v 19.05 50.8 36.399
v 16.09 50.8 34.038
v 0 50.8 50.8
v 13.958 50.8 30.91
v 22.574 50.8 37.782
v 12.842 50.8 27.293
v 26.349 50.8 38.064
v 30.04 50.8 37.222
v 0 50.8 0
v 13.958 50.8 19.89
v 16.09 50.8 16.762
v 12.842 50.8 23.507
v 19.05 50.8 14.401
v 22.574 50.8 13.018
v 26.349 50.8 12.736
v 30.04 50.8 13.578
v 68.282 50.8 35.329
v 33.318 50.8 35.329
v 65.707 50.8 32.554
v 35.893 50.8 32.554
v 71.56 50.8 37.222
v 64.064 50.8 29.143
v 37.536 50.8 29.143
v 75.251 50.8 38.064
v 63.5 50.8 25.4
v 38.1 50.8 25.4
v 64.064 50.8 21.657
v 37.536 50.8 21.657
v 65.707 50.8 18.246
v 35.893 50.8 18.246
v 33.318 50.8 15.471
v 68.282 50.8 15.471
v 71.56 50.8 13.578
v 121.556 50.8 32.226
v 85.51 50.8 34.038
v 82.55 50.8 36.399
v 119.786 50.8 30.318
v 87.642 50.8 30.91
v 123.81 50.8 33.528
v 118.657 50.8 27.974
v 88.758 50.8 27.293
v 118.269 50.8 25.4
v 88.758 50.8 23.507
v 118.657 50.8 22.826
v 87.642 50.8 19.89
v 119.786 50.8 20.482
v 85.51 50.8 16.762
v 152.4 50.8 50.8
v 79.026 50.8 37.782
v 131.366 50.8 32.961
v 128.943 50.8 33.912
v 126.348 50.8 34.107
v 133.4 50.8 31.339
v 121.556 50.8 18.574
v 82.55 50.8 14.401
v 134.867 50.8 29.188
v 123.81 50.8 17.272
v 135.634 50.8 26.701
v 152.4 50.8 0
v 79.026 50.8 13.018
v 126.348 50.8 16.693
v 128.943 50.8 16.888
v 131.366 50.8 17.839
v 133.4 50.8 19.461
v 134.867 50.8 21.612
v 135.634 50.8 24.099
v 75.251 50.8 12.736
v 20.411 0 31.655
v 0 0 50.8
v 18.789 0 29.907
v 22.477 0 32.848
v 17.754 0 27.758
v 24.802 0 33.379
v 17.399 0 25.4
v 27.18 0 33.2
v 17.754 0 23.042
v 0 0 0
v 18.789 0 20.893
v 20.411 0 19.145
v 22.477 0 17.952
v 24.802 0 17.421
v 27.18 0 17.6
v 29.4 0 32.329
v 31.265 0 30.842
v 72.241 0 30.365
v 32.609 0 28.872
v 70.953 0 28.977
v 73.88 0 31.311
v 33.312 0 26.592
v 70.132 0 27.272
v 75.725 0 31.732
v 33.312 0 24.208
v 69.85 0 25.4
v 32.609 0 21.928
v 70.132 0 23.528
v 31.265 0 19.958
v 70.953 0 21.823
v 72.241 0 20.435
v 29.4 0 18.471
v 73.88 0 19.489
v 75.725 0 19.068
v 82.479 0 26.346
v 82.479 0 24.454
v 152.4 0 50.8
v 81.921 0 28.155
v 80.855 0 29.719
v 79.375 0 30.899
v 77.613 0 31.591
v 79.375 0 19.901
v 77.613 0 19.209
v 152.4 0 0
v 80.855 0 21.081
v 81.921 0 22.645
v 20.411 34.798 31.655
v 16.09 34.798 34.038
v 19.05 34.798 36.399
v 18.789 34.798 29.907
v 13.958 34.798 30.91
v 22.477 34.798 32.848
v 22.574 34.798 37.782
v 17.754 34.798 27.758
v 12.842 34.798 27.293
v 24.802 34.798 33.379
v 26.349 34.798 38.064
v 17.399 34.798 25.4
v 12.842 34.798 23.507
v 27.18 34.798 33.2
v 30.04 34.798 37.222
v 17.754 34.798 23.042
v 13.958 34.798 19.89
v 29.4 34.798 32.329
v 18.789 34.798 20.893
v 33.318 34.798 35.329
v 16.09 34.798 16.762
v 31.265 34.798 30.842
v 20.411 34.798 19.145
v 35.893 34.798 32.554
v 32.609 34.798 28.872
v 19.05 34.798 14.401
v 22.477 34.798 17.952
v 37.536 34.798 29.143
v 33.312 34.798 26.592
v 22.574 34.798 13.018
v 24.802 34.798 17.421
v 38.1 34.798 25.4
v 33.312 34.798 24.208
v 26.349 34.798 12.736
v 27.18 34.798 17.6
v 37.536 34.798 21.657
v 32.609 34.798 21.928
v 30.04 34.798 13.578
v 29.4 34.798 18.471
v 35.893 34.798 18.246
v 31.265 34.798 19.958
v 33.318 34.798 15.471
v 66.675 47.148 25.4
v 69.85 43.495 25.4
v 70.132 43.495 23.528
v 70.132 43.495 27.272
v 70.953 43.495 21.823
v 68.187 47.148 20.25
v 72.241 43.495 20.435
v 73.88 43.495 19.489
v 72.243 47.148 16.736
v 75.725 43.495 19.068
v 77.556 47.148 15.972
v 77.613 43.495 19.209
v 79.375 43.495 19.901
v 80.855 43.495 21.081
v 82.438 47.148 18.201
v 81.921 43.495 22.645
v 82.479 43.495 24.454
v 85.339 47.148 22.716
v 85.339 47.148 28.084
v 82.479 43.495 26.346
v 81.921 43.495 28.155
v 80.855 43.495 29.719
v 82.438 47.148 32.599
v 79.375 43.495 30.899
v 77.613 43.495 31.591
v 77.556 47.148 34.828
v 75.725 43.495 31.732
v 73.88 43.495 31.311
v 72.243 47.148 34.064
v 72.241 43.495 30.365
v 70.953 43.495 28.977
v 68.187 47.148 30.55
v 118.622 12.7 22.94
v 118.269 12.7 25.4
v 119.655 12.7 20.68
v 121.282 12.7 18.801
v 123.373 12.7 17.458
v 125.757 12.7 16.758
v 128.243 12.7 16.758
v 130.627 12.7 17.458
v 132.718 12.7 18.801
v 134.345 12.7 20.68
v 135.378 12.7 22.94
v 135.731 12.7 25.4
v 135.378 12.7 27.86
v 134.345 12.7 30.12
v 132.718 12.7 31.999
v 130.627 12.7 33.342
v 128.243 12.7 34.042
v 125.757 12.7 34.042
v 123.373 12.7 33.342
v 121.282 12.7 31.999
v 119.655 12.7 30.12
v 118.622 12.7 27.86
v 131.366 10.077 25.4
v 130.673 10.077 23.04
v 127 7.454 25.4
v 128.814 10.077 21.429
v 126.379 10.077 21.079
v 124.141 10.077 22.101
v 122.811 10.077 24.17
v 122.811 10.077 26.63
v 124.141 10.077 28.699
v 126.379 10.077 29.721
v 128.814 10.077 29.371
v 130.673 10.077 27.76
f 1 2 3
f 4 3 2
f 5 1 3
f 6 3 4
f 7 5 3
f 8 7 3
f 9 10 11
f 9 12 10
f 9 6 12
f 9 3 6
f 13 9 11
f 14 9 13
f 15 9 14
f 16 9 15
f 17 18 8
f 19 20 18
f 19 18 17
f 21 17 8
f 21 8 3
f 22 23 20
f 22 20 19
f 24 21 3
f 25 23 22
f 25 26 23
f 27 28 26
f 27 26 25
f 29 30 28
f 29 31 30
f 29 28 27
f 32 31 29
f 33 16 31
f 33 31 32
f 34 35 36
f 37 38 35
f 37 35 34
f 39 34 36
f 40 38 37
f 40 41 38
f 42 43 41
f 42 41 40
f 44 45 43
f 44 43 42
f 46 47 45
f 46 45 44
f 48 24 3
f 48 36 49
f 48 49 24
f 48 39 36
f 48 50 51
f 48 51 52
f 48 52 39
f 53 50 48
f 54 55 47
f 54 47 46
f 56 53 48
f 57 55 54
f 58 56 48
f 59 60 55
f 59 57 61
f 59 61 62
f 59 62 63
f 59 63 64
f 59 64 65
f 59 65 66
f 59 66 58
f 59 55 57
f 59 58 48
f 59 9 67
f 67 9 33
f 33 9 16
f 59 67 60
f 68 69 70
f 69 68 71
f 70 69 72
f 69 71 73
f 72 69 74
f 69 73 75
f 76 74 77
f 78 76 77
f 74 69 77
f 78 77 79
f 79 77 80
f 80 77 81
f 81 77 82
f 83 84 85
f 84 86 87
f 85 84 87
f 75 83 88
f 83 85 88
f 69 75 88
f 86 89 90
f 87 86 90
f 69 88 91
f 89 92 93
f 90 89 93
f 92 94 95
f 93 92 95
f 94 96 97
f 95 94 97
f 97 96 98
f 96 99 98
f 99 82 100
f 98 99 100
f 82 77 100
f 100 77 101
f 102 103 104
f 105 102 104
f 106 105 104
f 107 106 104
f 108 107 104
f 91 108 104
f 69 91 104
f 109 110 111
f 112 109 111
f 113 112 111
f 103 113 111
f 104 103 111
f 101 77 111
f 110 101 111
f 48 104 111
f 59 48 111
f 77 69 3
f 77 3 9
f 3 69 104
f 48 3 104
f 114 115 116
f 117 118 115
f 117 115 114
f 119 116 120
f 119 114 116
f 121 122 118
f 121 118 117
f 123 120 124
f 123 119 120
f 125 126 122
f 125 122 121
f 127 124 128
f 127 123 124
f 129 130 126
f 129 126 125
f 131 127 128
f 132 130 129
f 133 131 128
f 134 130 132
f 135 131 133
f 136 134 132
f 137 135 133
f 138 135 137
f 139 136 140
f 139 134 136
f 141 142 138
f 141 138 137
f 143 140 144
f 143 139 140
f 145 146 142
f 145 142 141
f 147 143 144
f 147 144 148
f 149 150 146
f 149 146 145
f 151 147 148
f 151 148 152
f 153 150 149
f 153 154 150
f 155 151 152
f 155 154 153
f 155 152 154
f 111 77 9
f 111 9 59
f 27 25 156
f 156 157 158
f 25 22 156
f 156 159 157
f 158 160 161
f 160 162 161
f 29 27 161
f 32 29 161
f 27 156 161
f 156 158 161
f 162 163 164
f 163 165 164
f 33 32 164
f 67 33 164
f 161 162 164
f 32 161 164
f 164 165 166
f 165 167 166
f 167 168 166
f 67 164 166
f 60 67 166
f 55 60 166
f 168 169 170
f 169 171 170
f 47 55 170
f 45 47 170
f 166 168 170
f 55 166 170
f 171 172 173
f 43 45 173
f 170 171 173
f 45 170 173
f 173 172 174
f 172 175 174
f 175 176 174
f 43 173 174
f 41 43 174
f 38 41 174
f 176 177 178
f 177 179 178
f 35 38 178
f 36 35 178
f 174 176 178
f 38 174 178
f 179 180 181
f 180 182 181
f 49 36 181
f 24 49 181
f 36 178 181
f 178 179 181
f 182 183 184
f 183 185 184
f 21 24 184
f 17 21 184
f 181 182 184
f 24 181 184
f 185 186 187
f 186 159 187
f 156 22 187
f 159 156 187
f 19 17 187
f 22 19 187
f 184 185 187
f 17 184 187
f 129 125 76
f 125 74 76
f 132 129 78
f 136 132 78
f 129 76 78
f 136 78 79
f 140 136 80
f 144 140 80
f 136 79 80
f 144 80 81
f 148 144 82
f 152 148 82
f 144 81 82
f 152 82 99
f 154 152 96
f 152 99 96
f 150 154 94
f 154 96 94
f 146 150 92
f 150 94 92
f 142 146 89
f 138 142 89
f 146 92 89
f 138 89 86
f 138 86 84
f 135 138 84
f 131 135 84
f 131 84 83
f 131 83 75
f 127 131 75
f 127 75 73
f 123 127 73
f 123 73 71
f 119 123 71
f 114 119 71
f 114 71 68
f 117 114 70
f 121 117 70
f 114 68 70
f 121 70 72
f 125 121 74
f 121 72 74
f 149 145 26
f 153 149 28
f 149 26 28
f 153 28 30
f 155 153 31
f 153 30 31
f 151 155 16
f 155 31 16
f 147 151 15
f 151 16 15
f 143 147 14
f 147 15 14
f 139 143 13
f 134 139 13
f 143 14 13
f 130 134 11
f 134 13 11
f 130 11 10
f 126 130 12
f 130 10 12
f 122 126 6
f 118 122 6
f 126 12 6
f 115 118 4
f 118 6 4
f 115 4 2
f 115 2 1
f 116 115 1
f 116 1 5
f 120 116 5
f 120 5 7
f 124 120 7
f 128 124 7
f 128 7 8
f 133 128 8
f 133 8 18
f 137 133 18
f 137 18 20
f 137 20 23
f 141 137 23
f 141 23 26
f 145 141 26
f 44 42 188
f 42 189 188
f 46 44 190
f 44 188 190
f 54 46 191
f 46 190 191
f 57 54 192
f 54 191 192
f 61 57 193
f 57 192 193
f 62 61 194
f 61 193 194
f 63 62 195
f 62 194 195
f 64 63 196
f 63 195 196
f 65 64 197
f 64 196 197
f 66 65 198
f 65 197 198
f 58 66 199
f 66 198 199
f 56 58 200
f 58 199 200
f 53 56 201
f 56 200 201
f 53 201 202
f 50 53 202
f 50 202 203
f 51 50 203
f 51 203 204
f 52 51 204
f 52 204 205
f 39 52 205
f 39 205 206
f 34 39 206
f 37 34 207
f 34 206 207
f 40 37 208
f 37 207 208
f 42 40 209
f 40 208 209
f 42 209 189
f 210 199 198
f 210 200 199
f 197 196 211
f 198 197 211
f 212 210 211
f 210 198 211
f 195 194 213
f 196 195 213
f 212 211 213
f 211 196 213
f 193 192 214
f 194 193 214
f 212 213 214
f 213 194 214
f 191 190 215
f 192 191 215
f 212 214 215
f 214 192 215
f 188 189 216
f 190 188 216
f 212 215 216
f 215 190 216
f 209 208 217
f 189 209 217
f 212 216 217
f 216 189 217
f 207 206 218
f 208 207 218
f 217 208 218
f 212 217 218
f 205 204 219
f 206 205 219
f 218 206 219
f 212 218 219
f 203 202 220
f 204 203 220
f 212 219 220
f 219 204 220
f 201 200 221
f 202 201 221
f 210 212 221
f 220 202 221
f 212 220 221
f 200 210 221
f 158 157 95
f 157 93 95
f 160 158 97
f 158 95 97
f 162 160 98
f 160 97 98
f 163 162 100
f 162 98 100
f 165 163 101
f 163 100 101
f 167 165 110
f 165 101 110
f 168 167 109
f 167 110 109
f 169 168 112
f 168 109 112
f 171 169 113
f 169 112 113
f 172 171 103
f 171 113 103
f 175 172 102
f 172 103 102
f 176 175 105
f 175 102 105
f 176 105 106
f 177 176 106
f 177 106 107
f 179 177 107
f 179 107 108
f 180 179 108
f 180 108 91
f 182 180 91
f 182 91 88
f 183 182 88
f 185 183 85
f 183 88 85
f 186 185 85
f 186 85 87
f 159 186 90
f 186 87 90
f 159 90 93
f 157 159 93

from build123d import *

# Parameters (mm, degrees)
SKETCH1_W                                           = 152.4
SKETCH1_H                                           = 50.8
BOSS_EXTRUDE1_DEPTH                                 = 50.8
F_3_4_16_TAPPED_HOLE1_D                             = 17.4625
F_3_4_16_TAPPED_HOLE1_DEPTH                         = 38.1
F_3_4_16_TAPPED_HOLE1_TIP                           = 5.24626428
CBORE_FOR_0_BINDING_HEAD_MACHINE_SCREW2_D           = 16.002
CBORE_FOR_0_BINDING_HEAD_MACHINE_SCREW2_CBORE_D     = 25.4
CBORE_FOR_0_BINDING_HEAD_MACHINE_SCREW2_CBORE_DEPTH = 16.002
CSK_FOR_0_FLAT_HEAD_MACHINE_SCREW_100_D             = 12.7
CSK_FOR_0_FLAT_HEAD_MACHINE_SCREW_100_CSINK_D       = 25.4
CSK_FOR_0_FLAT_HEAD_MACHINE_SCREW_100_CSINK_ANGLE   = 82


with BuildPart() as part:
    # Sketch1 → Boss-Extrude1 (new body)
    with BuildSketch(Plane(origin=(0, 0, 0), x_dir=(1, 0, 0), z_dir=(0, 1, 0))):
        with Locations((76.2, -25.4)):
            Rectangle(SKETCH1_W, SKETCH1_H)
    extrude(amount=BOSS_EXTRUDE1_DEPTH)

    # 3/4-16 Tapped Hole1
    with Locations(Plane(origin=(0, 50.8, 0), x_dir=(1, 0, 0), z_dir=(0, 1, 0))):
        with Locations((127, -25.4)):
            Hole(F_3_4_16_TAPPED_HOLE1_D / 2, depth=F_3_4_16_TAPPED_HOLE1_DEPTH)
            with Locations((0, 0, -(F_3_4_16_TAPPED_HOLE1_DEPTH + F_3_4_16_TAPPED_HOLE1_TIP / 2))):  # 118° drill point
                Cone(0, F_3_4_16_TAPPED_HOLE1_D / 2, F_3_4_16_TAPPED_HOLE1_TIP, mode=Mode.SUBTRACT)

    # CBORE for #0 Binding Head Machine Screw2 (through all)
    with Locations(Plane(origin=(0, 50.8, 0), x_dir=(1, 0, 0), z_dir=(0, 1, 0))):
        with Locations((25.4, -25.4)):
            CounterBoreHole(CBORE_FOR_0_BINDING_HEAD_MACHINE_SCREW2_D / 2, CBORE_FOR_0_BINDING_HEAD_MACHINE_SCREW2_CBORE_D / 2, CBORE_FOR_0_BINDING_HEAD_MACHINE_SCREW2_CBORE_DEPTH)

    # CSK for #0 Flat Head Machine Screw (100)3 (through all)
    with Locations(Plane(origin=(0, 50.8, 0), x_dir=(1, 0, 0), z_dir=(0, 1, 0))):
        with Locations((76.2, -25.4)):
            CounterSinkHole(CSK_FOR_0_FLAT_HEAD_MACHINE_SCREW_100_D / 2, CSK_FOR_0_FLAT_HEAD_MACHINE_SCREW_100_CSINK_D / 2, counter_sink_angle=CSK_FOR_0_FLAT_HEAD_MACHINE_SCREW_100_CSINK_ANGLE)


solid = part.part
